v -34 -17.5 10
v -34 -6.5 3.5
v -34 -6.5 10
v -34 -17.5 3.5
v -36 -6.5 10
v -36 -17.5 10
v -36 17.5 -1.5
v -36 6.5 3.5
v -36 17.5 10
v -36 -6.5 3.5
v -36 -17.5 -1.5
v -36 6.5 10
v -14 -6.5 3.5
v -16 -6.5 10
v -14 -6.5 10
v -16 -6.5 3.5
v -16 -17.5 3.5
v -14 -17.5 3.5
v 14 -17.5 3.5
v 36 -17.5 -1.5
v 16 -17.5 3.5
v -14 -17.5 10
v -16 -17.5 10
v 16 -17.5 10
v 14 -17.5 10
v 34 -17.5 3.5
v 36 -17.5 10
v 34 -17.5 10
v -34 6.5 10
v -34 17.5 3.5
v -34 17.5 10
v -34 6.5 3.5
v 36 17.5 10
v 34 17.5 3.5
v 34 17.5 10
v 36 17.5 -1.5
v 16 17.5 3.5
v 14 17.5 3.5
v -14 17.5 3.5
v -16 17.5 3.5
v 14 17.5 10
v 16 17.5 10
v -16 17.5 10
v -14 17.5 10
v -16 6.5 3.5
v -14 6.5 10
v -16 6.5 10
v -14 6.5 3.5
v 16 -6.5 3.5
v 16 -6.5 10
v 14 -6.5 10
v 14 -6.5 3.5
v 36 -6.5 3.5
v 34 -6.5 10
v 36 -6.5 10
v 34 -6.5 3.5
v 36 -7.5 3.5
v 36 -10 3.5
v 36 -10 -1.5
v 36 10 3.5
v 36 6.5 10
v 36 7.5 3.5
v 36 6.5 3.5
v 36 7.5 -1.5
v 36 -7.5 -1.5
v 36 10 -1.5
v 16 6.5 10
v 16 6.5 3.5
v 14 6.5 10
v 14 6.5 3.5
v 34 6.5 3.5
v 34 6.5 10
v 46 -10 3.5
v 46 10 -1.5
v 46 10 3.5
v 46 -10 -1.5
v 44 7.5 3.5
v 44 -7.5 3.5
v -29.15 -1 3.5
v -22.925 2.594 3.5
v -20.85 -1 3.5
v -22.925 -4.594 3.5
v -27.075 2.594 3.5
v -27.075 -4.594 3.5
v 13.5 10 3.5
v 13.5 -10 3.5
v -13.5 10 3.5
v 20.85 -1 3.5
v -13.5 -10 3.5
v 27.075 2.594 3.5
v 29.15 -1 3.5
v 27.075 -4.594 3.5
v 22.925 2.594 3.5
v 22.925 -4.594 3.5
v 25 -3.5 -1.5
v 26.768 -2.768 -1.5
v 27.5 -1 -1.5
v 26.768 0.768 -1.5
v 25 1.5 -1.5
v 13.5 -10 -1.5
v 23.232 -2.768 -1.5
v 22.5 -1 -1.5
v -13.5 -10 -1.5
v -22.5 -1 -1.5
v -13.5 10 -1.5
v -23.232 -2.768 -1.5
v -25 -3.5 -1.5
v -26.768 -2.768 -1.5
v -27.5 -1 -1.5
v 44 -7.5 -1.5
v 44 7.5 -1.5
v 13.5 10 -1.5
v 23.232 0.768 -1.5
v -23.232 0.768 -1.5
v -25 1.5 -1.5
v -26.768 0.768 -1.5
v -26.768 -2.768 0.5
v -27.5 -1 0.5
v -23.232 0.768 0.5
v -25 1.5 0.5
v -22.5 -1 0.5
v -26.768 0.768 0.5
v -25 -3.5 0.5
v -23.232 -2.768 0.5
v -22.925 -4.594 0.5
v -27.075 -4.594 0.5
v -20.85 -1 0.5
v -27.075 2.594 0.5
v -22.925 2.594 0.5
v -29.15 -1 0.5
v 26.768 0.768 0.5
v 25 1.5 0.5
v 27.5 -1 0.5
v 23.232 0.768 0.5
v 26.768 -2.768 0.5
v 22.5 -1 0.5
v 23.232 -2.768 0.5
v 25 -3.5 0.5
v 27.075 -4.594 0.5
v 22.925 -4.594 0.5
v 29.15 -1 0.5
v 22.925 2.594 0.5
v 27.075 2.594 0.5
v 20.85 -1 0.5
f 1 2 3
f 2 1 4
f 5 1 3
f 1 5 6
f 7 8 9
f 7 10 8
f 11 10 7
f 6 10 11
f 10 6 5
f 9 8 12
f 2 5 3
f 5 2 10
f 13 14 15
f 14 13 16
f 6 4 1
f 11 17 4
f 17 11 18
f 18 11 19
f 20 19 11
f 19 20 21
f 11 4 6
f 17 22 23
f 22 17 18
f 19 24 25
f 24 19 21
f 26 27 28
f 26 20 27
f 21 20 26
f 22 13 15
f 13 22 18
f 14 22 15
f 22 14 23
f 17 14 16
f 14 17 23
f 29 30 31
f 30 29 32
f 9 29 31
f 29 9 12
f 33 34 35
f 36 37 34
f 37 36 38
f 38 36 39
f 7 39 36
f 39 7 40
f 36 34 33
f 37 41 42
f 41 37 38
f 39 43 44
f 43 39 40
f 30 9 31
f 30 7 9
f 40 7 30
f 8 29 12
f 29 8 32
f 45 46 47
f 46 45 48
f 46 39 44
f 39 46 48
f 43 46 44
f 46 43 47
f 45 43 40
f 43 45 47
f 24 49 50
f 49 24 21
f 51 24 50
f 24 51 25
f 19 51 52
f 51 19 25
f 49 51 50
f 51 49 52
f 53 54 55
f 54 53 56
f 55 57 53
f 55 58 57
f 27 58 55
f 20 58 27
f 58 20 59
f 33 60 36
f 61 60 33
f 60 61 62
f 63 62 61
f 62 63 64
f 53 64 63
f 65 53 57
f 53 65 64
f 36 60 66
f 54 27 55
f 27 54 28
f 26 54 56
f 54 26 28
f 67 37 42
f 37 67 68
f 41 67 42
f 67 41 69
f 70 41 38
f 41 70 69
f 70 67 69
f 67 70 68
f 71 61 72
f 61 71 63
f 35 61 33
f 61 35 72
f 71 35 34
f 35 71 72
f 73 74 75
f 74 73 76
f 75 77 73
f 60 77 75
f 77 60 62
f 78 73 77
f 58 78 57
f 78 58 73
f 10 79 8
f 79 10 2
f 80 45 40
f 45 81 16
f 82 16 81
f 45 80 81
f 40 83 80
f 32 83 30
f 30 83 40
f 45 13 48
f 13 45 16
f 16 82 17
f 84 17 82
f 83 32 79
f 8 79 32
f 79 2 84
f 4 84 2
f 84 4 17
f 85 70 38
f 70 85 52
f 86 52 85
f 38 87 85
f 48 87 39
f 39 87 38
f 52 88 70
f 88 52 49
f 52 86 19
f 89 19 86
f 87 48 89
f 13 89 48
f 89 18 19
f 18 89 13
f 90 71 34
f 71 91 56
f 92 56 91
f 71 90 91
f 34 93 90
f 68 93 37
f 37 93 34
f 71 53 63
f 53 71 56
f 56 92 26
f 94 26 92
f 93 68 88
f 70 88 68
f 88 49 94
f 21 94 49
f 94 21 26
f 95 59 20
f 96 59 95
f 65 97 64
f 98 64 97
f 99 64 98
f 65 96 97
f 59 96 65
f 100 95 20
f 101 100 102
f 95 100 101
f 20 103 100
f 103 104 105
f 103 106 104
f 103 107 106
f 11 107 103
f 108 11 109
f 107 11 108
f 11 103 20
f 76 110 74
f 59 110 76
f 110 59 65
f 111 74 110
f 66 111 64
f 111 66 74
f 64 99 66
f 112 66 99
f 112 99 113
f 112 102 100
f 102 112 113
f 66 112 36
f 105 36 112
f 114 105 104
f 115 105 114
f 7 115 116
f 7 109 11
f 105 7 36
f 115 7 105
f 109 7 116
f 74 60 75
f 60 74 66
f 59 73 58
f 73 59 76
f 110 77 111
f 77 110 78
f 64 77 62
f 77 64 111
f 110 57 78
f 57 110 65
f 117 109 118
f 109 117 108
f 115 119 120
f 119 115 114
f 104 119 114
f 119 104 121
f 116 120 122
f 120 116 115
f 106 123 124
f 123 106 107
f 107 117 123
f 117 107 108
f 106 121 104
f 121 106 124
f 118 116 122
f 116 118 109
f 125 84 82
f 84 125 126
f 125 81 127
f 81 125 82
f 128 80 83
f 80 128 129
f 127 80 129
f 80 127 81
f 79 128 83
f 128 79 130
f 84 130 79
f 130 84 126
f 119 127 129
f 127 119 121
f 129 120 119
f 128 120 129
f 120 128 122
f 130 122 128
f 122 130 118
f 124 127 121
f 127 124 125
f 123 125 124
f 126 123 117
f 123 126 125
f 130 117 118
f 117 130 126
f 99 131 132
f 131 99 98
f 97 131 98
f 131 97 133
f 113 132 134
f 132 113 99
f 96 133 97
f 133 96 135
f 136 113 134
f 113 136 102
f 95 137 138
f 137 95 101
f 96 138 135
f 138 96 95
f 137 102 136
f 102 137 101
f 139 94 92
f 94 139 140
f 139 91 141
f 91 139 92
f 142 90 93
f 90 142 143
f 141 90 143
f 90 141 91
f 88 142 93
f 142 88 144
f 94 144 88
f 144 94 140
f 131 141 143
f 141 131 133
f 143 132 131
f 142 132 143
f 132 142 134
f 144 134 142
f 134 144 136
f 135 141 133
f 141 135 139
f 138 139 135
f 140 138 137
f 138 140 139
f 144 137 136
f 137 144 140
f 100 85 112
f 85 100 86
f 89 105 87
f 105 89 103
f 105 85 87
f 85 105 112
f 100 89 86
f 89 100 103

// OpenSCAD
x_rod_spacing = 50;
two_extruders=false;

difference(){

	union(){
		if (!two_extruders)
			translate([0,0,1])
				cube([x_rod_spacing+22, 35,5],center=true);
		if (two_extruders)
			translate([0,15,1])
				cube([x_rod_spacing+22, 65,5],center=true);
		for (x=[-1,1]) 
			for (y=[-1,1]){
				if (!two_extruders)
					translate([x_rod_spacing/2*x,12*y,0]) grip();
				if (two_extruders)
					translate([x_rod_spacing/2*x,12*y+15*(y+1),0]) grip();
			}
		translate([(x_rod_spacing+22)/2,0,1]) {
			if (!two_extruders) difference(){
				cube([20,20,5],center=true);	
				cube([16,15,6],center=true);
			}
			if (two_extruders) translate([0,15,0]) 
				difference(){
					cube([20,20,5],center=true);	
					cube([16,15,6],center=true);
				}
		}

	}

	for (x=[-1,1]) union(){
		translate([50/2*x,-1,0]) cylinder(r=5/2,h=20,center=true);
		translate([50/2*x,-1,2]) cylinder(r=8.3/2,h=3,center=true,$fn=6);
	}
	cube([27,20,10],center=true);

	if(two_extruders) translate([0,31,0]){
		for (x=[-1,1]) union(){
			translate([50/2*x,0,0]) cylinder(r=5/2,h=20,center=true);
			translate([50/2*x,0,2]) cylinder(r=8.3/2,h=3,center=true,$fn=6);
		}
		cube([27,20,10],center=true);
	}


}

module grip(){
	render() {
		translate([0,0,1]) 
			cube([20,11,2],center=true);
		for (x=[-1,1]) translate([10*x,0,5]) {
			cube([2,11,10], center=true);
		}
	}	
}
